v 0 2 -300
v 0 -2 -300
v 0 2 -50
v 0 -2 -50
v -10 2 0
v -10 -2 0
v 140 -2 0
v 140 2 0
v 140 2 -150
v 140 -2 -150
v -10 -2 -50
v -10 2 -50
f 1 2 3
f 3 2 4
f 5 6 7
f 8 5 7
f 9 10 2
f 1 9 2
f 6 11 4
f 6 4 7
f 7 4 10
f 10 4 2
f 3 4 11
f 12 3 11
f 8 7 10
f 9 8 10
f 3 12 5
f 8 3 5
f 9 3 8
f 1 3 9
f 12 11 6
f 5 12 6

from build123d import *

# Parameters (mm, degrees)
ESTRUSIONE_ESTRUSIONE1_DEPTH      = 2
ESTRUSIONE_ESTRUSIONE1_DEPTH_BACK = 2


with BuildPart() as part:
    # Forma aletta → Estrusione-Estrusione1 (new, two sides: drawn at the far end of the back side and taken through both)
    with BuildSketch(Plane(origin=(0, 0, 0), x_dir=(1, 0, 0), z_dir=(0, 1, 0)).offset(-ESTRUSIONE_ESTRUSIONE1_DEPTH_BACK)):
        Polygon((0, 300), (0, 50), (-10, 50), (-10, 0), (0, 0), (140, 0), (140, 150), align=None)
    extrude(amount=ESTRUSIONE_ESTRUSIONE1_DEPTH + ESTRUSIONE_ESTRUSIONE1_DEPTH_BACK)


solid = part.part
